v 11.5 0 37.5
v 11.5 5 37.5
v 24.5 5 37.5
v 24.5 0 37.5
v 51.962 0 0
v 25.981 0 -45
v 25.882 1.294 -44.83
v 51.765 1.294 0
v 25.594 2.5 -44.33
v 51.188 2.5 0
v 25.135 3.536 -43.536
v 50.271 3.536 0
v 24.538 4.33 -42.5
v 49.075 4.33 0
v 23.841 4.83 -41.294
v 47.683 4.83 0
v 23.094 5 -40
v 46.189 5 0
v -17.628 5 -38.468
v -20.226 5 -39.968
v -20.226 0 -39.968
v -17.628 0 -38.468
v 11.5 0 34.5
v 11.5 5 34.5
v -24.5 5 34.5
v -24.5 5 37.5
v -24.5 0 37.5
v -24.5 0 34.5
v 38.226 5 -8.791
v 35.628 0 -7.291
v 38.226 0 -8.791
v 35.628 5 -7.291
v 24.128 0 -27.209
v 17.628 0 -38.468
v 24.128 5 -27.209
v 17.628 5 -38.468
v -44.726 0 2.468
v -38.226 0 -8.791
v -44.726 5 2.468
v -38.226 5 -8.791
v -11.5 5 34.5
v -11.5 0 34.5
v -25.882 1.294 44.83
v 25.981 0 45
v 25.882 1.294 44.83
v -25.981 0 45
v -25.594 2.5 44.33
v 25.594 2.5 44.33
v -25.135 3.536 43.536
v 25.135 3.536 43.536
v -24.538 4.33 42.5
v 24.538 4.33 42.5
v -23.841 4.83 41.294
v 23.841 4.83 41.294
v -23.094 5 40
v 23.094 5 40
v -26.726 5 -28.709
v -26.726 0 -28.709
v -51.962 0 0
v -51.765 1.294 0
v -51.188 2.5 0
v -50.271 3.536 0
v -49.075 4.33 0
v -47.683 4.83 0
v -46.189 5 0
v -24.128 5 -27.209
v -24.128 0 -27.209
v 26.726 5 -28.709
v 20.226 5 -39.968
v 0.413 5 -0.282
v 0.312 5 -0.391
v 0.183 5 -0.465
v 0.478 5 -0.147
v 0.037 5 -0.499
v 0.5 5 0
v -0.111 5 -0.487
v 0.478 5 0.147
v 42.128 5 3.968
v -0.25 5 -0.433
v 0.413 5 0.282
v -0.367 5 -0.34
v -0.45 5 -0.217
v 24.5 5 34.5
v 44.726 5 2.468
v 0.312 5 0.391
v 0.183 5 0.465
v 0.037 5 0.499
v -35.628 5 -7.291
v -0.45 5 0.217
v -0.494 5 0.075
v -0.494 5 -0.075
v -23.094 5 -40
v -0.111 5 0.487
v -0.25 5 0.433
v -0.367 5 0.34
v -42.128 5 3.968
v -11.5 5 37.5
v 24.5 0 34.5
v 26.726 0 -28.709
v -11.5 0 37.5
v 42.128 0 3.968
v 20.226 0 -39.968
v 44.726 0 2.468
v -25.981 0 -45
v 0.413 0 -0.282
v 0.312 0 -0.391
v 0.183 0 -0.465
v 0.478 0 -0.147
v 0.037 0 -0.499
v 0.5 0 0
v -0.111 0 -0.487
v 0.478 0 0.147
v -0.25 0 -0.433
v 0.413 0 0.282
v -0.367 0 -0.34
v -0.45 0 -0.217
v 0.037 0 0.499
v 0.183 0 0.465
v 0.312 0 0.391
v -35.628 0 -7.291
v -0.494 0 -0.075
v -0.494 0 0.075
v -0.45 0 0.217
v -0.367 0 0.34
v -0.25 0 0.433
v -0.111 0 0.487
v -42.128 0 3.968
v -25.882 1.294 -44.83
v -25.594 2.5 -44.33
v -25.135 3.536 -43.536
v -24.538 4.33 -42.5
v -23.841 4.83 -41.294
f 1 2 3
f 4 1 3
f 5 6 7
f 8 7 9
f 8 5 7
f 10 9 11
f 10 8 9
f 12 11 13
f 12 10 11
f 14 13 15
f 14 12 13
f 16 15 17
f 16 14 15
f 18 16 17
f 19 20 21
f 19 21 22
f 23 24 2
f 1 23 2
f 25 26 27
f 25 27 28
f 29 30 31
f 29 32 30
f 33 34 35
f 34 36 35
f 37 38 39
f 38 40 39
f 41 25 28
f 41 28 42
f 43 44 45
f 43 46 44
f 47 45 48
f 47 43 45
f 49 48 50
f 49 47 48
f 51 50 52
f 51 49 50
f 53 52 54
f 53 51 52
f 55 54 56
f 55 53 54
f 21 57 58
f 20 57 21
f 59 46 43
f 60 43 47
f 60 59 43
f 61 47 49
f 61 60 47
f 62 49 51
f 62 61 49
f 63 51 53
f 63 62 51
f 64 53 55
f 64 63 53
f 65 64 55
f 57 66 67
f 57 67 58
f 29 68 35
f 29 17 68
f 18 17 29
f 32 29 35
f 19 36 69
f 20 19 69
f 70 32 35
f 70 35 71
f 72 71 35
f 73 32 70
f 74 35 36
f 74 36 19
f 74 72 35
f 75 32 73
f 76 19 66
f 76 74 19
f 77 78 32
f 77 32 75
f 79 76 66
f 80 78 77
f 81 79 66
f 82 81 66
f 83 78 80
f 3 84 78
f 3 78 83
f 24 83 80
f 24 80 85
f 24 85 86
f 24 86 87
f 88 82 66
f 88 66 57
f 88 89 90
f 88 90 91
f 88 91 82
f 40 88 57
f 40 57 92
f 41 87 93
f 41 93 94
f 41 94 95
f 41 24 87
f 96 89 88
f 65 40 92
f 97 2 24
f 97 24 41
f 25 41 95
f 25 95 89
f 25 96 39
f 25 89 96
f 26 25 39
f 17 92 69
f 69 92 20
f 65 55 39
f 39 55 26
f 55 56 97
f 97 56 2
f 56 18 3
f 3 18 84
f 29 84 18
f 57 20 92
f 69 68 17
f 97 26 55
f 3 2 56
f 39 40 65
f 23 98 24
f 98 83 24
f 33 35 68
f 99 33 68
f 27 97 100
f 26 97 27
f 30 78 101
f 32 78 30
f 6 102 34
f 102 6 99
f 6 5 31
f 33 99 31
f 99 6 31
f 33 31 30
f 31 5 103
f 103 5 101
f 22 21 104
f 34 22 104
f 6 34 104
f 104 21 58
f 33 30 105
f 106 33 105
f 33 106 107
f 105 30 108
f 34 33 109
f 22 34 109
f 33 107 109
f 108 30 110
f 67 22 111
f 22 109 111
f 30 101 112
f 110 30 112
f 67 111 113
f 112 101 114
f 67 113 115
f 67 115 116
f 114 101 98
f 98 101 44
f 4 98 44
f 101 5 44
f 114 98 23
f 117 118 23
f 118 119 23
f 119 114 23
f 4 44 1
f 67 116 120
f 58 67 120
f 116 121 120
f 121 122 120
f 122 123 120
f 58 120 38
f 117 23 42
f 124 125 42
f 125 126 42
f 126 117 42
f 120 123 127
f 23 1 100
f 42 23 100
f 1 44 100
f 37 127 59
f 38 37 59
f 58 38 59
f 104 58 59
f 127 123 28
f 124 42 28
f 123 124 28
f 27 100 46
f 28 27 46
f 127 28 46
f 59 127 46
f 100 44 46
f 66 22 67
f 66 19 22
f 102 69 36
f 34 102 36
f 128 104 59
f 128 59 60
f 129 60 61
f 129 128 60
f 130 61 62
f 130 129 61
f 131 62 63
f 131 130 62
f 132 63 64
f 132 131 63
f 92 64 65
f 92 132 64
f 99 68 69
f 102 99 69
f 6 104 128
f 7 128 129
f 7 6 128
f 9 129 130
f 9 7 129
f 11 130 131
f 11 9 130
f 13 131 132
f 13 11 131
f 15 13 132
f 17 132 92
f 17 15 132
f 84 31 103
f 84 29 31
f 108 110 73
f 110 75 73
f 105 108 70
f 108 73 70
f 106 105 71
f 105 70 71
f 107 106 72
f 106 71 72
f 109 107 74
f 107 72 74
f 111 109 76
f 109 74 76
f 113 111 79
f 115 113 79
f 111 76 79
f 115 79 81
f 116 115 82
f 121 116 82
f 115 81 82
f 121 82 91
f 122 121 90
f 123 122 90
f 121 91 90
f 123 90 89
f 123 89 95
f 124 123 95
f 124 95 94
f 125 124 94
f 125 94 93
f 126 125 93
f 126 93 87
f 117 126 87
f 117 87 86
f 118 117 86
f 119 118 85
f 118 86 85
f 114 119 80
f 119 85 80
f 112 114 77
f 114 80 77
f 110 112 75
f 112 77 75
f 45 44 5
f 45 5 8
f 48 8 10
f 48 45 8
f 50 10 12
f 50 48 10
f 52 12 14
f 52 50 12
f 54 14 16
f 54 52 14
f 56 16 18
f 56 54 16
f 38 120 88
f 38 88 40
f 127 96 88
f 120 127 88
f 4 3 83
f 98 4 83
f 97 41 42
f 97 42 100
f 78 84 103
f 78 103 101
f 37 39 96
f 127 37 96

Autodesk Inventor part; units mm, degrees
ref_plane "YZ Plane" through (0, 0, 0) normal (1, 0, 0) x (0, 1, 0)
ref_plane "XZ Plane" through (0, 0, 0) normal (0, 1, 0) x (-1, 0, 0)
ref_plane "XY Plane" through (0, 0, 0) normal (0, 0, 1) x (1, 0, 0)
sketch "Sketch1" plane through (0, 0, 0) normal (0, 1, 0) x (-1, 0, 0)
  line L0 (51.9615, 0) -> (25.9808, -45)
  line L1 (25.9808, -45) -> (-25.9808, -45)
  line L2 (-25.9808, -45) -> (-51.9615, 0)
  line L3 (-51.9615, 0) -> (-25.9808, 45)
  line L4 (-25.9808, 45) -> (25.9808, 45)
  line L5 (25.9808, 45) -> (51.9615, 0)
  point P0 (0, 0)
  point P1 (0, 0)
  dimension "d1" = 45
  dimension "d2" = 45
extrude "Extrusion1" add sketch "Sketch1" along normal blind 5
sketch "Sketch2" plane through (0, 5, 0) normal (0, 1, 0) x (1, 0, 0)
  line L0 (-25.9808, 45) -> (-51.9615, 0) projected
  line L1 (-38.9711, 22.5) -> (-47.9711, 6.9115)
  line L2 (-38.9711, 22.5) -> (-29.9711, 38.0885)
  line L3 (-47.9711, 6.9115) -> (-40.1769, 2.4115)
  line L4 (-38.226, 8.7907) -> (-44.726, -2.4676)
  line L5 (-44.726, -2.4676) -> (-42.1279, -3.9676)
  line L6 (-42.1279, -3.9676) -> (-35.6279, 7.2907)
  line L7 (-35.6279, 7.2907) -> (-38.226, 8.7907)
  line L8 (-38.226, 8.7907) -> (-42.1279, -3.9676) construction
  line L9 (-44.726, -2.4676) -> (-35.6279, 7.2907) construction
  line L10 (-38.226, 8.7907) -> (-25.226, 8.7907) construction
  line L11 (-29.9711, 38.0885) -> (-22.1769, 33.5885)
  line L12 (-17.6279, 38.4676) -> (-24.1279, 27.2093)
  line L13 (-24.1279, 27.2093) -> (-26.726, 28.7093)
  line L14 (-26.726, 28.7093) -> (-20.226, 39.9676)
  line L15 (-20.226, 39.9676) -> (-17.6279, 38.4676)
  line L16 (-17.6279, 38.4676) -> (-26.726, 28.7093) construction
  line L17 (-24.1279, 27.2093) -> (-20.226, 39.9676) construction
  circle A0 centre (0, 0) radius 0.5
  dimension "d5" = 18
  dimension "d6" = 18
  dimension "d7" = 9
  dimension "d8" = 90
  dimension "d9" = 13
  dimension "d10" = 120
  dimension "d11" = 3
  dimension "d12" = 9
  dimension "d13" = 13
  dimension "d14" = 3
  dimension "d15" = 90
  dimension "d16" = 1
extrude "Extrusion2" cut sketch "Sketch2" against normal blind 5
pattern_circular "Circular Pattern1" count 3 over 360 about axis through (0, 5, 0) along (0, -1, 0) of "Extrusion2"
fillet "Fillet1" radius 5 6 edges at (38.9711, 5, 22.5) (38.9711, 5, -22.5) (0, 5, -45) (-38.9711, 5, -22.5) (-38.9711, 5, 22.5) (0, 5, 45)
properties part number "Bot_"
